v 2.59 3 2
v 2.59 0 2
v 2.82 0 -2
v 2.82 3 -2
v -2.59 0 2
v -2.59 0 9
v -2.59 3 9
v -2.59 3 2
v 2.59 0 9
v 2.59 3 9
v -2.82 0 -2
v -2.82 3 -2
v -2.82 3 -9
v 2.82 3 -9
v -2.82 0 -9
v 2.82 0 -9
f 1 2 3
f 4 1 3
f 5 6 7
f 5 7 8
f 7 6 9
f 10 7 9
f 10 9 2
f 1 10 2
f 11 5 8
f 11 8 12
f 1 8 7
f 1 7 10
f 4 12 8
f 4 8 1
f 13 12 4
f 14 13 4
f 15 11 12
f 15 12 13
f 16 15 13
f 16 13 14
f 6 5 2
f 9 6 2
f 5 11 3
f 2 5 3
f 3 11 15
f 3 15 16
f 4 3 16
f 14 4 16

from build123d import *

# Parameters (mm, degrees)
SKETCH1_W           = 5.64
SKETCH1_H           = 18
BOSS_EXTRUDE1_DEPTH = 3
CUT_EXTRUDE1_START  = -4
CUT_EXTRUDE1_DEPTH  = 5


with BuildPart() as part:
    # Sketch1 → Boss-Extrude1 (new body)
    with BuildSketch(Plane(origin=(0, 0, 0), x_dir=(1, 0, 0), z_dir=(0, 1, 0))):
        Rectangle(SKETCH1_W, SKETCH1_H)
    extrude(amount=BOSS_EXTRUDE1_DEPTH)

    # Sketch2 → Cut-Extrude1 (cut)
    with BuildSketch(Plane(origin=(0, 3, 0), x_dir=(1, 0, 0), z_dir=(0, 1, 0)).offset(CUT_EXTRUDE1_START)):
        Polygon((-2.59, -9), (-2.59, -2), (-2.82, 2), (-2.82, -9), align=None)
    cut_extrude1 = extrude(amount=CUT_EXTRUDE1_DEPTH, mode=Mode.SUBTRACT)

    # Mirror1: Cut-Extrude1 across plane
    add(cut_extrude1.mirror(Plane(origin=(0, 0, 0), x_dir=(0, 0, 1), z_dir=(1, 0, 0))), mode=Mode.SUBTRACT)


solid = part.part
